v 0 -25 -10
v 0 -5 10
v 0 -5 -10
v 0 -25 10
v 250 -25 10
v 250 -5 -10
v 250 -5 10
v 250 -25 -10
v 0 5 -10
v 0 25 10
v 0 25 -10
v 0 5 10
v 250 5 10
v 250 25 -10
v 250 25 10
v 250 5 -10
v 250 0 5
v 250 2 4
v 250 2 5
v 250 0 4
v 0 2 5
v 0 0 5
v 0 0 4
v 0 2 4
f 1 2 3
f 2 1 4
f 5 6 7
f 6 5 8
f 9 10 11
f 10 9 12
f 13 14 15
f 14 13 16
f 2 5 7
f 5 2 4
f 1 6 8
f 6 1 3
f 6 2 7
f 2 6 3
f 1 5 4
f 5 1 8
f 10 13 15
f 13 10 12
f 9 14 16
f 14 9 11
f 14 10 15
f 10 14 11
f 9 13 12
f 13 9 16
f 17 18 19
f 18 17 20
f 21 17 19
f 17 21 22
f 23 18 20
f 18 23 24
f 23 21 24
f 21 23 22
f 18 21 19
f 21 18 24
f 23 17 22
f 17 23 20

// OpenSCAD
module assembly_preview() {
  rod_d = 8.0;
  rod_spacing = 40.0;
  rod_len = 250.0;
  
  module rods(){
    color([0.7,0.7,0.7]) {
      translate([0, -rod_spacing/2, 0]) rotate([0,90,0]) cylinder(h=rod_len, d=rod_d, center=false);
      translate([0,  rod_spacing/2, 0]) rotate([0,90,0]) cylinder(h=rod_len, d=rod_d, center=false);
    }
  }
  rods();
  color([0.3,0.3,0.3]) translate([0, -25, -10]) cube([rod_len, 20, 20], center=false);
  color([0.3,0.3,0.3]) translate([0,  5, -10]) cube([rod_len, 20, 20], center=false);
  color([0.1,0.1,0.1]) translate([0,0,rod_d/2]) cube([rod_len, 2, 1], center=false);
  // Import and position printable parts manually if you want a full assembly preview.
}
assembly_preview();
